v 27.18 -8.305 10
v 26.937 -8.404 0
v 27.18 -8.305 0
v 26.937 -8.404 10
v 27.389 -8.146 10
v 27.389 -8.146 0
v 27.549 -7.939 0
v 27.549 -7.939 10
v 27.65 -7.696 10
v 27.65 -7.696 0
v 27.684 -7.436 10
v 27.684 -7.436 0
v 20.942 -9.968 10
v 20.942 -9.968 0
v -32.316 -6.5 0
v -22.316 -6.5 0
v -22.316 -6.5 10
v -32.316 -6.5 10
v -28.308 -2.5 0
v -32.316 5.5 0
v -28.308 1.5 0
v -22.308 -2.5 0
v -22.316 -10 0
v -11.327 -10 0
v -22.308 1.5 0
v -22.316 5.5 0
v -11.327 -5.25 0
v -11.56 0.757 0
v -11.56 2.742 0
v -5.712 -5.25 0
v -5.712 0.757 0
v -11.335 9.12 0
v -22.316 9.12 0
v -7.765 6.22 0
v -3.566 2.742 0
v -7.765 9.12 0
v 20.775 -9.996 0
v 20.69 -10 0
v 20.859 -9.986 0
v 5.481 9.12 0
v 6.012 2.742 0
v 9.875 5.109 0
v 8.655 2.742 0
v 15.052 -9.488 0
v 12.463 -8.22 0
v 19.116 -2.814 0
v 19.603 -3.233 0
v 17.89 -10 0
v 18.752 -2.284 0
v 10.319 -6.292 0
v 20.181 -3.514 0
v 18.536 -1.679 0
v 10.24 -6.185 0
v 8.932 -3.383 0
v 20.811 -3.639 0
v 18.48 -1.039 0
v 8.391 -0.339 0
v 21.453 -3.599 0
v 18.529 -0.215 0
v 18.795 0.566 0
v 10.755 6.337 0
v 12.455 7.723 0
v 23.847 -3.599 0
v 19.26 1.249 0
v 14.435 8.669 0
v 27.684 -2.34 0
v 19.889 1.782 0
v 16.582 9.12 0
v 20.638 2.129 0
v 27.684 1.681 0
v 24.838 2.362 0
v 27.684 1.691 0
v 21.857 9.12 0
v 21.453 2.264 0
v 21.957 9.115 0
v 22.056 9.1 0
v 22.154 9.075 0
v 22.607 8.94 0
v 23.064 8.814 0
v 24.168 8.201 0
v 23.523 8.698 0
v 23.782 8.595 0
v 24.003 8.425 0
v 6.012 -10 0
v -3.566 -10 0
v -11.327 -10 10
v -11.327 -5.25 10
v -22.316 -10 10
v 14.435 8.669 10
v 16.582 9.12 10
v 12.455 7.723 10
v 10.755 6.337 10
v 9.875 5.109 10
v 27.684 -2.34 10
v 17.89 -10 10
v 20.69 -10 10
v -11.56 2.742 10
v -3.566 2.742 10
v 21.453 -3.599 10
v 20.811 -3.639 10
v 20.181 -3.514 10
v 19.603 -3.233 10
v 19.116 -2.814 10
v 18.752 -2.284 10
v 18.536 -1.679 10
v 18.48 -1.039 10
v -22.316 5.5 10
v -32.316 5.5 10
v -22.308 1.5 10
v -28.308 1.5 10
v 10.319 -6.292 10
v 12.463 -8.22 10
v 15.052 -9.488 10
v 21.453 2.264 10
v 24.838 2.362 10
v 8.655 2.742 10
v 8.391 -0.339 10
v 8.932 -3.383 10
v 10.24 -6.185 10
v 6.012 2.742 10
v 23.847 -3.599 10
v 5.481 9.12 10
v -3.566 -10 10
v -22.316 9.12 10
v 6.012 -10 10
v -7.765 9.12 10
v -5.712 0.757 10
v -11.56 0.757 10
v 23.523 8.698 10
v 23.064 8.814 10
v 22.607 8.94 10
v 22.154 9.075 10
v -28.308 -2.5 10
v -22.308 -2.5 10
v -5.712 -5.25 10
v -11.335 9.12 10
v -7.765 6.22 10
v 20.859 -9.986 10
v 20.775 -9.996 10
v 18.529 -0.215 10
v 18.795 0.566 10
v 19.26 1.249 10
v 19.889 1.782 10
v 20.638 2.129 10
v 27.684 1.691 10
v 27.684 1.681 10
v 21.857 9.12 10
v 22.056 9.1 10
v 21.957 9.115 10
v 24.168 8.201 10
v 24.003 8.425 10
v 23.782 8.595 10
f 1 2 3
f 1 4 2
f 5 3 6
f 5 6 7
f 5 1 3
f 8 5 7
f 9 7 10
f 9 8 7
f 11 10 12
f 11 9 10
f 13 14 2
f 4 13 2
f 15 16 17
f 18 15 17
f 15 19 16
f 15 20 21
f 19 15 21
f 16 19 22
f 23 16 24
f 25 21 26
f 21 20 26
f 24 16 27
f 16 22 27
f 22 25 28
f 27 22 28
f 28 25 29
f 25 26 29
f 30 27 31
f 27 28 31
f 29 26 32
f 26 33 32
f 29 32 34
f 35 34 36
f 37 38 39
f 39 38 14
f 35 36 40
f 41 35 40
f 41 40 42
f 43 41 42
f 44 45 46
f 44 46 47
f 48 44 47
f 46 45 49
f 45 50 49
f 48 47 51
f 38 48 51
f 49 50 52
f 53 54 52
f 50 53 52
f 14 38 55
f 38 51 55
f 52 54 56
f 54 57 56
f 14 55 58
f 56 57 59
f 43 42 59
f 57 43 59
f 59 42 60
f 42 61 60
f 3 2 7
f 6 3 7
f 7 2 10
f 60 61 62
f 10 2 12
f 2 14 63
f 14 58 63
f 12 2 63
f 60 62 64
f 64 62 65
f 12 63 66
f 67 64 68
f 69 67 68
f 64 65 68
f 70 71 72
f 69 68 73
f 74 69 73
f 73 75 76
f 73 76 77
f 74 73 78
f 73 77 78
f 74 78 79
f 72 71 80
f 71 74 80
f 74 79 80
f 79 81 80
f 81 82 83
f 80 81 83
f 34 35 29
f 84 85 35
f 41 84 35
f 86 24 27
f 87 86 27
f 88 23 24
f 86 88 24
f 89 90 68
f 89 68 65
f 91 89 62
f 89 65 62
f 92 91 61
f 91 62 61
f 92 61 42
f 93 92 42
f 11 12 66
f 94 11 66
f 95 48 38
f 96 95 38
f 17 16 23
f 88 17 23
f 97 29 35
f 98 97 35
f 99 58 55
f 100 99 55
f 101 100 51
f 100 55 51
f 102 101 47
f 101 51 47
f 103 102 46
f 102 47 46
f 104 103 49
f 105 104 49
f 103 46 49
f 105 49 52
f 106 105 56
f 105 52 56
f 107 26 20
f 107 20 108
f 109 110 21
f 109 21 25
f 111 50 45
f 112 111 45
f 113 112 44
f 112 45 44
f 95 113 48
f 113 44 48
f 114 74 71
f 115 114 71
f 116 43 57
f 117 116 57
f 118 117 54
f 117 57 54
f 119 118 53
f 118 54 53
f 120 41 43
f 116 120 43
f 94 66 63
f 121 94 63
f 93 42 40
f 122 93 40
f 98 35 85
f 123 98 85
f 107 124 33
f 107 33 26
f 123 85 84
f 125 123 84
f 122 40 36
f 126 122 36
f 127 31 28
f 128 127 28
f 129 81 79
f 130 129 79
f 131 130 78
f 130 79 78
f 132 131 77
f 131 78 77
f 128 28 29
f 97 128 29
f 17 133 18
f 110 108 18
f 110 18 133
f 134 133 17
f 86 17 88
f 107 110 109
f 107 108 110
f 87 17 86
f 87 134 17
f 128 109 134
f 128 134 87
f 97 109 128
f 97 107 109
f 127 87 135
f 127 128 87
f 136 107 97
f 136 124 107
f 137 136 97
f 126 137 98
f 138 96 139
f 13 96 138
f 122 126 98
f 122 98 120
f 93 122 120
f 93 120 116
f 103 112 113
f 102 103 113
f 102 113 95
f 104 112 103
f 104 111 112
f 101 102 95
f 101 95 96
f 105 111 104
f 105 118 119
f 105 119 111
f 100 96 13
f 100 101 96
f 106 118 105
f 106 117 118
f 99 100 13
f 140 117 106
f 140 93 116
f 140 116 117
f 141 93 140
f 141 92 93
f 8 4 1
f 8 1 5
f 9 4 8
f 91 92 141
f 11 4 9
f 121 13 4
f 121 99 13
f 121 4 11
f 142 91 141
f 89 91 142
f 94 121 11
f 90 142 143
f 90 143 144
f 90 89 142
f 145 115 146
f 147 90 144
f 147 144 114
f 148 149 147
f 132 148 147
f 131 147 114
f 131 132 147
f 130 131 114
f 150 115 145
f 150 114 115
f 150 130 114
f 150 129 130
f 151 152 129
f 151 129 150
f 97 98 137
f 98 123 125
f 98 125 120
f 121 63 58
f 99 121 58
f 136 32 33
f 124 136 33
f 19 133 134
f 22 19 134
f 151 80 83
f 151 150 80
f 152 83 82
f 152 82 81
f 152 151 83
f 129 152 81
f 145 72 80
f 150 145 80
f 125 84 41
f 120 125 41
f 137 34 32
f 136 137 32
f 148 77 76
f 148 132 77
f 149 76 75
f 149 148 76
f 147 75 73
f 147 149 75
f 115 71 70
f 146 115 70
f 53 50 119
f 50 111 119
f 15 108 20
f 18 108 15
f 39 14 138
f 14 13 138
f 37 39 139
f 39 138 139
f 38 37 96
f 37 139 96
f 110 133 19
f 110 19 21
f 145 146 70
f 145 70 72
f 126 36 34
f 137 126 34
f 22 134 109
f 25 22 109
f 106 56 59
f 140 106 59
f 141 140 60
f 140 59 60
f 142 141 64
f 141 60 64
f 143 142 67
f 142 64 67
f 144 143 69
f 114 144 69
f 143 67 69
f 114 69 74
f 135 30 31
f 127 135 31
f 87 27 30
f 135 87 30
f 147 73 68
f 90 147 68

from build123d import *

# Parameters (mm, degrees)
F1_DEPTH = 10
F2_R     = 1
F3_R     = 1
F4_R     = 1
F5_W     = 12
F5_H     = 10
F6_DEPTH = 10
F7_W     = 6
F7_H     = 4
F8_DEPTH = 25


with BuildPart() as f1:
    # F0 (on Top) → F1 (new body)
    with BuildSketch(Plane.XY):
        with BuildLine():
            Line((-11.3350533053, 9.1202929616), (-22.3157362798, 9.1202929616))
            Line((-22.3157362798, 9.1202929616), (-22.3157362798, -10))
            Line((-22.3157362798, -10), (-11.3272070885, -10))
            Line((-11.3272070885, -10), (-11.3272070885, -5.2500292659))
            Line((-11.3272070885, -5.2500292659), (-5.7124928571, -5.2500292659))
            Line((-5.7124928571, -5.2500292659), (-5.7124928571, 0.7569257868))
            Line((-5.7124928571, 0.7569257868), (-11.560020037, 0.7569257868))
            Line((-11.560020037, 0.7569257868), (-11.560020037, 2.7420271654))
            Line((-11.560020037, 2.7420271654), (-3.565690713, 2.7420271654))
            Line((-3.565690713, 2.7420271654), (-3.565690713, -10))
            Line((-3.565690713, -10), (6.0123503208, -10))
            Line((6.0123503208, -10), (6.0123503208, 2.7420271654))
            Line((6.0123503208, 2.7420271654), (8.6545692757, 2.7420271654))
            ThreePointArc((8.6545692757, 2.7420271654), (8.5676927282, -1.911451746), (10.2760922164, -6.2408610247))
            ThreePointArc((10.2760922164, -6.2408610247), (13.6839247097, -8.9288594524), (17.8900292945, -10))
            Line((17.8900292945, -10), (18.7280271202, -10))
            Line((18.7280271202, -10), (20.8180968398, -10))
            Line((20.8180968398, -10), (27.6842637202, -8.2088258604))
            Line((27.6842637202, -8.2088258604), (27.6842637202, -2.3396474093))
            Line((27.6842637202, -2.3396474093), (23.8473247737, -3.5986430012))
            Line((23.8473247737, -3.5986430012), (21.4528143406, -3.5986430012))
            ThreePointArc((21.4528143406, -3.5986430012), (19.3461607597, -3.0392900389), (18.4803195298, -1.038994058))
            ThreePointArc((18.4803195298, -1.038994058), (19.2595578745, 1.248700369), (21.4528143406, 2.2637788206))
            Line((21.4528143406, 2.2637788206), (24.837708557, 2.3617743547))
            Line((24.837708557, 2.3617743547), (27.6842637202, 1.6806415132))
            Line((27.6842637202, 1.6806415132), (27.6842637202, 1.6911900602))
            Line((27.6842637202, 1.6911900602), (23.953304423, 8.5980716969))
            ThreePointArc((23.953304423, 8.5980716969), (22.975945626, 8.8371730757), (22.0104184033, 9.1202929616))
            Line((22.0104184033, 9.1202929616), (16.5817085654, 9.1202929616))
            ThreePointArc((16.5817085654, 9.1202929616), (13.4167991013, 8.2553236841), (10.7552717232, 6.3367054882))
            Line((10.7552717232, 6.3367054882), (9.8750670095, 5.1085127981))
            Line((9.8750670095, 5.1085127981), (5.4812123415, 9.1202929616))
            Line((5.4812123415, 9.1202929616), (-7.7649741434, 9.1202929616))
            Line((-7.7649741434, 9.1202929616), (-7.7649741434, 6.2196037167))
            Line((-7.7649741434, 6.2196037167), (-11.3350533053, 9.1202929616))
        make_face()
    extrude(amount=F1_DEPTH)

    # F2
    f2_edges = [f1.edges().sort_by_distance(p)[0] for p in [
        (23.953304, 8.598072, 5),
        (22.010418, 9.120293, 5),
    ]]
    fillet(f2_edges, radius=F2_R)

    # F3
    f3_edges = [f1.edges().sort_by_distance(p)[0] for p in [
        (17.890029, -10, 5),
        (20.818097, -10, 5),
    ]]
    fillet(f3_edges, radius=F3_R)

    # F4
    f4_edges = [f1.edges().sort_by_distance(p)[0] for p in [
        (27.684264, -8.208826, 5),
        (10.276092, -6.240861, 5),
    ]]
    fillet(f4_edges, radius=F4_R)

    # F5 (on face) → F6 (join)
    with BuildSketch(Plane(origin=(-22.3157362798, 0, 0), x_dir=(0, -1, 0), z_dir=(-1, 0, 0))):
        with Locations((0.5, 5)):
            Rectangle(F5_W, F5_H)
    extrude(amount=F6_DEPTH)

    # F7 (on face) → F8 (cut)
    with BuildSketch(Plane.XY.offset(10)):
        with Locations((-25.3084501922, -0.5)):
            Rectangle(F7_W, F7_H)
    extrude(amount=-F8_DEPTH, mode=Mode.SUBTRACT)


solid = f1.part
